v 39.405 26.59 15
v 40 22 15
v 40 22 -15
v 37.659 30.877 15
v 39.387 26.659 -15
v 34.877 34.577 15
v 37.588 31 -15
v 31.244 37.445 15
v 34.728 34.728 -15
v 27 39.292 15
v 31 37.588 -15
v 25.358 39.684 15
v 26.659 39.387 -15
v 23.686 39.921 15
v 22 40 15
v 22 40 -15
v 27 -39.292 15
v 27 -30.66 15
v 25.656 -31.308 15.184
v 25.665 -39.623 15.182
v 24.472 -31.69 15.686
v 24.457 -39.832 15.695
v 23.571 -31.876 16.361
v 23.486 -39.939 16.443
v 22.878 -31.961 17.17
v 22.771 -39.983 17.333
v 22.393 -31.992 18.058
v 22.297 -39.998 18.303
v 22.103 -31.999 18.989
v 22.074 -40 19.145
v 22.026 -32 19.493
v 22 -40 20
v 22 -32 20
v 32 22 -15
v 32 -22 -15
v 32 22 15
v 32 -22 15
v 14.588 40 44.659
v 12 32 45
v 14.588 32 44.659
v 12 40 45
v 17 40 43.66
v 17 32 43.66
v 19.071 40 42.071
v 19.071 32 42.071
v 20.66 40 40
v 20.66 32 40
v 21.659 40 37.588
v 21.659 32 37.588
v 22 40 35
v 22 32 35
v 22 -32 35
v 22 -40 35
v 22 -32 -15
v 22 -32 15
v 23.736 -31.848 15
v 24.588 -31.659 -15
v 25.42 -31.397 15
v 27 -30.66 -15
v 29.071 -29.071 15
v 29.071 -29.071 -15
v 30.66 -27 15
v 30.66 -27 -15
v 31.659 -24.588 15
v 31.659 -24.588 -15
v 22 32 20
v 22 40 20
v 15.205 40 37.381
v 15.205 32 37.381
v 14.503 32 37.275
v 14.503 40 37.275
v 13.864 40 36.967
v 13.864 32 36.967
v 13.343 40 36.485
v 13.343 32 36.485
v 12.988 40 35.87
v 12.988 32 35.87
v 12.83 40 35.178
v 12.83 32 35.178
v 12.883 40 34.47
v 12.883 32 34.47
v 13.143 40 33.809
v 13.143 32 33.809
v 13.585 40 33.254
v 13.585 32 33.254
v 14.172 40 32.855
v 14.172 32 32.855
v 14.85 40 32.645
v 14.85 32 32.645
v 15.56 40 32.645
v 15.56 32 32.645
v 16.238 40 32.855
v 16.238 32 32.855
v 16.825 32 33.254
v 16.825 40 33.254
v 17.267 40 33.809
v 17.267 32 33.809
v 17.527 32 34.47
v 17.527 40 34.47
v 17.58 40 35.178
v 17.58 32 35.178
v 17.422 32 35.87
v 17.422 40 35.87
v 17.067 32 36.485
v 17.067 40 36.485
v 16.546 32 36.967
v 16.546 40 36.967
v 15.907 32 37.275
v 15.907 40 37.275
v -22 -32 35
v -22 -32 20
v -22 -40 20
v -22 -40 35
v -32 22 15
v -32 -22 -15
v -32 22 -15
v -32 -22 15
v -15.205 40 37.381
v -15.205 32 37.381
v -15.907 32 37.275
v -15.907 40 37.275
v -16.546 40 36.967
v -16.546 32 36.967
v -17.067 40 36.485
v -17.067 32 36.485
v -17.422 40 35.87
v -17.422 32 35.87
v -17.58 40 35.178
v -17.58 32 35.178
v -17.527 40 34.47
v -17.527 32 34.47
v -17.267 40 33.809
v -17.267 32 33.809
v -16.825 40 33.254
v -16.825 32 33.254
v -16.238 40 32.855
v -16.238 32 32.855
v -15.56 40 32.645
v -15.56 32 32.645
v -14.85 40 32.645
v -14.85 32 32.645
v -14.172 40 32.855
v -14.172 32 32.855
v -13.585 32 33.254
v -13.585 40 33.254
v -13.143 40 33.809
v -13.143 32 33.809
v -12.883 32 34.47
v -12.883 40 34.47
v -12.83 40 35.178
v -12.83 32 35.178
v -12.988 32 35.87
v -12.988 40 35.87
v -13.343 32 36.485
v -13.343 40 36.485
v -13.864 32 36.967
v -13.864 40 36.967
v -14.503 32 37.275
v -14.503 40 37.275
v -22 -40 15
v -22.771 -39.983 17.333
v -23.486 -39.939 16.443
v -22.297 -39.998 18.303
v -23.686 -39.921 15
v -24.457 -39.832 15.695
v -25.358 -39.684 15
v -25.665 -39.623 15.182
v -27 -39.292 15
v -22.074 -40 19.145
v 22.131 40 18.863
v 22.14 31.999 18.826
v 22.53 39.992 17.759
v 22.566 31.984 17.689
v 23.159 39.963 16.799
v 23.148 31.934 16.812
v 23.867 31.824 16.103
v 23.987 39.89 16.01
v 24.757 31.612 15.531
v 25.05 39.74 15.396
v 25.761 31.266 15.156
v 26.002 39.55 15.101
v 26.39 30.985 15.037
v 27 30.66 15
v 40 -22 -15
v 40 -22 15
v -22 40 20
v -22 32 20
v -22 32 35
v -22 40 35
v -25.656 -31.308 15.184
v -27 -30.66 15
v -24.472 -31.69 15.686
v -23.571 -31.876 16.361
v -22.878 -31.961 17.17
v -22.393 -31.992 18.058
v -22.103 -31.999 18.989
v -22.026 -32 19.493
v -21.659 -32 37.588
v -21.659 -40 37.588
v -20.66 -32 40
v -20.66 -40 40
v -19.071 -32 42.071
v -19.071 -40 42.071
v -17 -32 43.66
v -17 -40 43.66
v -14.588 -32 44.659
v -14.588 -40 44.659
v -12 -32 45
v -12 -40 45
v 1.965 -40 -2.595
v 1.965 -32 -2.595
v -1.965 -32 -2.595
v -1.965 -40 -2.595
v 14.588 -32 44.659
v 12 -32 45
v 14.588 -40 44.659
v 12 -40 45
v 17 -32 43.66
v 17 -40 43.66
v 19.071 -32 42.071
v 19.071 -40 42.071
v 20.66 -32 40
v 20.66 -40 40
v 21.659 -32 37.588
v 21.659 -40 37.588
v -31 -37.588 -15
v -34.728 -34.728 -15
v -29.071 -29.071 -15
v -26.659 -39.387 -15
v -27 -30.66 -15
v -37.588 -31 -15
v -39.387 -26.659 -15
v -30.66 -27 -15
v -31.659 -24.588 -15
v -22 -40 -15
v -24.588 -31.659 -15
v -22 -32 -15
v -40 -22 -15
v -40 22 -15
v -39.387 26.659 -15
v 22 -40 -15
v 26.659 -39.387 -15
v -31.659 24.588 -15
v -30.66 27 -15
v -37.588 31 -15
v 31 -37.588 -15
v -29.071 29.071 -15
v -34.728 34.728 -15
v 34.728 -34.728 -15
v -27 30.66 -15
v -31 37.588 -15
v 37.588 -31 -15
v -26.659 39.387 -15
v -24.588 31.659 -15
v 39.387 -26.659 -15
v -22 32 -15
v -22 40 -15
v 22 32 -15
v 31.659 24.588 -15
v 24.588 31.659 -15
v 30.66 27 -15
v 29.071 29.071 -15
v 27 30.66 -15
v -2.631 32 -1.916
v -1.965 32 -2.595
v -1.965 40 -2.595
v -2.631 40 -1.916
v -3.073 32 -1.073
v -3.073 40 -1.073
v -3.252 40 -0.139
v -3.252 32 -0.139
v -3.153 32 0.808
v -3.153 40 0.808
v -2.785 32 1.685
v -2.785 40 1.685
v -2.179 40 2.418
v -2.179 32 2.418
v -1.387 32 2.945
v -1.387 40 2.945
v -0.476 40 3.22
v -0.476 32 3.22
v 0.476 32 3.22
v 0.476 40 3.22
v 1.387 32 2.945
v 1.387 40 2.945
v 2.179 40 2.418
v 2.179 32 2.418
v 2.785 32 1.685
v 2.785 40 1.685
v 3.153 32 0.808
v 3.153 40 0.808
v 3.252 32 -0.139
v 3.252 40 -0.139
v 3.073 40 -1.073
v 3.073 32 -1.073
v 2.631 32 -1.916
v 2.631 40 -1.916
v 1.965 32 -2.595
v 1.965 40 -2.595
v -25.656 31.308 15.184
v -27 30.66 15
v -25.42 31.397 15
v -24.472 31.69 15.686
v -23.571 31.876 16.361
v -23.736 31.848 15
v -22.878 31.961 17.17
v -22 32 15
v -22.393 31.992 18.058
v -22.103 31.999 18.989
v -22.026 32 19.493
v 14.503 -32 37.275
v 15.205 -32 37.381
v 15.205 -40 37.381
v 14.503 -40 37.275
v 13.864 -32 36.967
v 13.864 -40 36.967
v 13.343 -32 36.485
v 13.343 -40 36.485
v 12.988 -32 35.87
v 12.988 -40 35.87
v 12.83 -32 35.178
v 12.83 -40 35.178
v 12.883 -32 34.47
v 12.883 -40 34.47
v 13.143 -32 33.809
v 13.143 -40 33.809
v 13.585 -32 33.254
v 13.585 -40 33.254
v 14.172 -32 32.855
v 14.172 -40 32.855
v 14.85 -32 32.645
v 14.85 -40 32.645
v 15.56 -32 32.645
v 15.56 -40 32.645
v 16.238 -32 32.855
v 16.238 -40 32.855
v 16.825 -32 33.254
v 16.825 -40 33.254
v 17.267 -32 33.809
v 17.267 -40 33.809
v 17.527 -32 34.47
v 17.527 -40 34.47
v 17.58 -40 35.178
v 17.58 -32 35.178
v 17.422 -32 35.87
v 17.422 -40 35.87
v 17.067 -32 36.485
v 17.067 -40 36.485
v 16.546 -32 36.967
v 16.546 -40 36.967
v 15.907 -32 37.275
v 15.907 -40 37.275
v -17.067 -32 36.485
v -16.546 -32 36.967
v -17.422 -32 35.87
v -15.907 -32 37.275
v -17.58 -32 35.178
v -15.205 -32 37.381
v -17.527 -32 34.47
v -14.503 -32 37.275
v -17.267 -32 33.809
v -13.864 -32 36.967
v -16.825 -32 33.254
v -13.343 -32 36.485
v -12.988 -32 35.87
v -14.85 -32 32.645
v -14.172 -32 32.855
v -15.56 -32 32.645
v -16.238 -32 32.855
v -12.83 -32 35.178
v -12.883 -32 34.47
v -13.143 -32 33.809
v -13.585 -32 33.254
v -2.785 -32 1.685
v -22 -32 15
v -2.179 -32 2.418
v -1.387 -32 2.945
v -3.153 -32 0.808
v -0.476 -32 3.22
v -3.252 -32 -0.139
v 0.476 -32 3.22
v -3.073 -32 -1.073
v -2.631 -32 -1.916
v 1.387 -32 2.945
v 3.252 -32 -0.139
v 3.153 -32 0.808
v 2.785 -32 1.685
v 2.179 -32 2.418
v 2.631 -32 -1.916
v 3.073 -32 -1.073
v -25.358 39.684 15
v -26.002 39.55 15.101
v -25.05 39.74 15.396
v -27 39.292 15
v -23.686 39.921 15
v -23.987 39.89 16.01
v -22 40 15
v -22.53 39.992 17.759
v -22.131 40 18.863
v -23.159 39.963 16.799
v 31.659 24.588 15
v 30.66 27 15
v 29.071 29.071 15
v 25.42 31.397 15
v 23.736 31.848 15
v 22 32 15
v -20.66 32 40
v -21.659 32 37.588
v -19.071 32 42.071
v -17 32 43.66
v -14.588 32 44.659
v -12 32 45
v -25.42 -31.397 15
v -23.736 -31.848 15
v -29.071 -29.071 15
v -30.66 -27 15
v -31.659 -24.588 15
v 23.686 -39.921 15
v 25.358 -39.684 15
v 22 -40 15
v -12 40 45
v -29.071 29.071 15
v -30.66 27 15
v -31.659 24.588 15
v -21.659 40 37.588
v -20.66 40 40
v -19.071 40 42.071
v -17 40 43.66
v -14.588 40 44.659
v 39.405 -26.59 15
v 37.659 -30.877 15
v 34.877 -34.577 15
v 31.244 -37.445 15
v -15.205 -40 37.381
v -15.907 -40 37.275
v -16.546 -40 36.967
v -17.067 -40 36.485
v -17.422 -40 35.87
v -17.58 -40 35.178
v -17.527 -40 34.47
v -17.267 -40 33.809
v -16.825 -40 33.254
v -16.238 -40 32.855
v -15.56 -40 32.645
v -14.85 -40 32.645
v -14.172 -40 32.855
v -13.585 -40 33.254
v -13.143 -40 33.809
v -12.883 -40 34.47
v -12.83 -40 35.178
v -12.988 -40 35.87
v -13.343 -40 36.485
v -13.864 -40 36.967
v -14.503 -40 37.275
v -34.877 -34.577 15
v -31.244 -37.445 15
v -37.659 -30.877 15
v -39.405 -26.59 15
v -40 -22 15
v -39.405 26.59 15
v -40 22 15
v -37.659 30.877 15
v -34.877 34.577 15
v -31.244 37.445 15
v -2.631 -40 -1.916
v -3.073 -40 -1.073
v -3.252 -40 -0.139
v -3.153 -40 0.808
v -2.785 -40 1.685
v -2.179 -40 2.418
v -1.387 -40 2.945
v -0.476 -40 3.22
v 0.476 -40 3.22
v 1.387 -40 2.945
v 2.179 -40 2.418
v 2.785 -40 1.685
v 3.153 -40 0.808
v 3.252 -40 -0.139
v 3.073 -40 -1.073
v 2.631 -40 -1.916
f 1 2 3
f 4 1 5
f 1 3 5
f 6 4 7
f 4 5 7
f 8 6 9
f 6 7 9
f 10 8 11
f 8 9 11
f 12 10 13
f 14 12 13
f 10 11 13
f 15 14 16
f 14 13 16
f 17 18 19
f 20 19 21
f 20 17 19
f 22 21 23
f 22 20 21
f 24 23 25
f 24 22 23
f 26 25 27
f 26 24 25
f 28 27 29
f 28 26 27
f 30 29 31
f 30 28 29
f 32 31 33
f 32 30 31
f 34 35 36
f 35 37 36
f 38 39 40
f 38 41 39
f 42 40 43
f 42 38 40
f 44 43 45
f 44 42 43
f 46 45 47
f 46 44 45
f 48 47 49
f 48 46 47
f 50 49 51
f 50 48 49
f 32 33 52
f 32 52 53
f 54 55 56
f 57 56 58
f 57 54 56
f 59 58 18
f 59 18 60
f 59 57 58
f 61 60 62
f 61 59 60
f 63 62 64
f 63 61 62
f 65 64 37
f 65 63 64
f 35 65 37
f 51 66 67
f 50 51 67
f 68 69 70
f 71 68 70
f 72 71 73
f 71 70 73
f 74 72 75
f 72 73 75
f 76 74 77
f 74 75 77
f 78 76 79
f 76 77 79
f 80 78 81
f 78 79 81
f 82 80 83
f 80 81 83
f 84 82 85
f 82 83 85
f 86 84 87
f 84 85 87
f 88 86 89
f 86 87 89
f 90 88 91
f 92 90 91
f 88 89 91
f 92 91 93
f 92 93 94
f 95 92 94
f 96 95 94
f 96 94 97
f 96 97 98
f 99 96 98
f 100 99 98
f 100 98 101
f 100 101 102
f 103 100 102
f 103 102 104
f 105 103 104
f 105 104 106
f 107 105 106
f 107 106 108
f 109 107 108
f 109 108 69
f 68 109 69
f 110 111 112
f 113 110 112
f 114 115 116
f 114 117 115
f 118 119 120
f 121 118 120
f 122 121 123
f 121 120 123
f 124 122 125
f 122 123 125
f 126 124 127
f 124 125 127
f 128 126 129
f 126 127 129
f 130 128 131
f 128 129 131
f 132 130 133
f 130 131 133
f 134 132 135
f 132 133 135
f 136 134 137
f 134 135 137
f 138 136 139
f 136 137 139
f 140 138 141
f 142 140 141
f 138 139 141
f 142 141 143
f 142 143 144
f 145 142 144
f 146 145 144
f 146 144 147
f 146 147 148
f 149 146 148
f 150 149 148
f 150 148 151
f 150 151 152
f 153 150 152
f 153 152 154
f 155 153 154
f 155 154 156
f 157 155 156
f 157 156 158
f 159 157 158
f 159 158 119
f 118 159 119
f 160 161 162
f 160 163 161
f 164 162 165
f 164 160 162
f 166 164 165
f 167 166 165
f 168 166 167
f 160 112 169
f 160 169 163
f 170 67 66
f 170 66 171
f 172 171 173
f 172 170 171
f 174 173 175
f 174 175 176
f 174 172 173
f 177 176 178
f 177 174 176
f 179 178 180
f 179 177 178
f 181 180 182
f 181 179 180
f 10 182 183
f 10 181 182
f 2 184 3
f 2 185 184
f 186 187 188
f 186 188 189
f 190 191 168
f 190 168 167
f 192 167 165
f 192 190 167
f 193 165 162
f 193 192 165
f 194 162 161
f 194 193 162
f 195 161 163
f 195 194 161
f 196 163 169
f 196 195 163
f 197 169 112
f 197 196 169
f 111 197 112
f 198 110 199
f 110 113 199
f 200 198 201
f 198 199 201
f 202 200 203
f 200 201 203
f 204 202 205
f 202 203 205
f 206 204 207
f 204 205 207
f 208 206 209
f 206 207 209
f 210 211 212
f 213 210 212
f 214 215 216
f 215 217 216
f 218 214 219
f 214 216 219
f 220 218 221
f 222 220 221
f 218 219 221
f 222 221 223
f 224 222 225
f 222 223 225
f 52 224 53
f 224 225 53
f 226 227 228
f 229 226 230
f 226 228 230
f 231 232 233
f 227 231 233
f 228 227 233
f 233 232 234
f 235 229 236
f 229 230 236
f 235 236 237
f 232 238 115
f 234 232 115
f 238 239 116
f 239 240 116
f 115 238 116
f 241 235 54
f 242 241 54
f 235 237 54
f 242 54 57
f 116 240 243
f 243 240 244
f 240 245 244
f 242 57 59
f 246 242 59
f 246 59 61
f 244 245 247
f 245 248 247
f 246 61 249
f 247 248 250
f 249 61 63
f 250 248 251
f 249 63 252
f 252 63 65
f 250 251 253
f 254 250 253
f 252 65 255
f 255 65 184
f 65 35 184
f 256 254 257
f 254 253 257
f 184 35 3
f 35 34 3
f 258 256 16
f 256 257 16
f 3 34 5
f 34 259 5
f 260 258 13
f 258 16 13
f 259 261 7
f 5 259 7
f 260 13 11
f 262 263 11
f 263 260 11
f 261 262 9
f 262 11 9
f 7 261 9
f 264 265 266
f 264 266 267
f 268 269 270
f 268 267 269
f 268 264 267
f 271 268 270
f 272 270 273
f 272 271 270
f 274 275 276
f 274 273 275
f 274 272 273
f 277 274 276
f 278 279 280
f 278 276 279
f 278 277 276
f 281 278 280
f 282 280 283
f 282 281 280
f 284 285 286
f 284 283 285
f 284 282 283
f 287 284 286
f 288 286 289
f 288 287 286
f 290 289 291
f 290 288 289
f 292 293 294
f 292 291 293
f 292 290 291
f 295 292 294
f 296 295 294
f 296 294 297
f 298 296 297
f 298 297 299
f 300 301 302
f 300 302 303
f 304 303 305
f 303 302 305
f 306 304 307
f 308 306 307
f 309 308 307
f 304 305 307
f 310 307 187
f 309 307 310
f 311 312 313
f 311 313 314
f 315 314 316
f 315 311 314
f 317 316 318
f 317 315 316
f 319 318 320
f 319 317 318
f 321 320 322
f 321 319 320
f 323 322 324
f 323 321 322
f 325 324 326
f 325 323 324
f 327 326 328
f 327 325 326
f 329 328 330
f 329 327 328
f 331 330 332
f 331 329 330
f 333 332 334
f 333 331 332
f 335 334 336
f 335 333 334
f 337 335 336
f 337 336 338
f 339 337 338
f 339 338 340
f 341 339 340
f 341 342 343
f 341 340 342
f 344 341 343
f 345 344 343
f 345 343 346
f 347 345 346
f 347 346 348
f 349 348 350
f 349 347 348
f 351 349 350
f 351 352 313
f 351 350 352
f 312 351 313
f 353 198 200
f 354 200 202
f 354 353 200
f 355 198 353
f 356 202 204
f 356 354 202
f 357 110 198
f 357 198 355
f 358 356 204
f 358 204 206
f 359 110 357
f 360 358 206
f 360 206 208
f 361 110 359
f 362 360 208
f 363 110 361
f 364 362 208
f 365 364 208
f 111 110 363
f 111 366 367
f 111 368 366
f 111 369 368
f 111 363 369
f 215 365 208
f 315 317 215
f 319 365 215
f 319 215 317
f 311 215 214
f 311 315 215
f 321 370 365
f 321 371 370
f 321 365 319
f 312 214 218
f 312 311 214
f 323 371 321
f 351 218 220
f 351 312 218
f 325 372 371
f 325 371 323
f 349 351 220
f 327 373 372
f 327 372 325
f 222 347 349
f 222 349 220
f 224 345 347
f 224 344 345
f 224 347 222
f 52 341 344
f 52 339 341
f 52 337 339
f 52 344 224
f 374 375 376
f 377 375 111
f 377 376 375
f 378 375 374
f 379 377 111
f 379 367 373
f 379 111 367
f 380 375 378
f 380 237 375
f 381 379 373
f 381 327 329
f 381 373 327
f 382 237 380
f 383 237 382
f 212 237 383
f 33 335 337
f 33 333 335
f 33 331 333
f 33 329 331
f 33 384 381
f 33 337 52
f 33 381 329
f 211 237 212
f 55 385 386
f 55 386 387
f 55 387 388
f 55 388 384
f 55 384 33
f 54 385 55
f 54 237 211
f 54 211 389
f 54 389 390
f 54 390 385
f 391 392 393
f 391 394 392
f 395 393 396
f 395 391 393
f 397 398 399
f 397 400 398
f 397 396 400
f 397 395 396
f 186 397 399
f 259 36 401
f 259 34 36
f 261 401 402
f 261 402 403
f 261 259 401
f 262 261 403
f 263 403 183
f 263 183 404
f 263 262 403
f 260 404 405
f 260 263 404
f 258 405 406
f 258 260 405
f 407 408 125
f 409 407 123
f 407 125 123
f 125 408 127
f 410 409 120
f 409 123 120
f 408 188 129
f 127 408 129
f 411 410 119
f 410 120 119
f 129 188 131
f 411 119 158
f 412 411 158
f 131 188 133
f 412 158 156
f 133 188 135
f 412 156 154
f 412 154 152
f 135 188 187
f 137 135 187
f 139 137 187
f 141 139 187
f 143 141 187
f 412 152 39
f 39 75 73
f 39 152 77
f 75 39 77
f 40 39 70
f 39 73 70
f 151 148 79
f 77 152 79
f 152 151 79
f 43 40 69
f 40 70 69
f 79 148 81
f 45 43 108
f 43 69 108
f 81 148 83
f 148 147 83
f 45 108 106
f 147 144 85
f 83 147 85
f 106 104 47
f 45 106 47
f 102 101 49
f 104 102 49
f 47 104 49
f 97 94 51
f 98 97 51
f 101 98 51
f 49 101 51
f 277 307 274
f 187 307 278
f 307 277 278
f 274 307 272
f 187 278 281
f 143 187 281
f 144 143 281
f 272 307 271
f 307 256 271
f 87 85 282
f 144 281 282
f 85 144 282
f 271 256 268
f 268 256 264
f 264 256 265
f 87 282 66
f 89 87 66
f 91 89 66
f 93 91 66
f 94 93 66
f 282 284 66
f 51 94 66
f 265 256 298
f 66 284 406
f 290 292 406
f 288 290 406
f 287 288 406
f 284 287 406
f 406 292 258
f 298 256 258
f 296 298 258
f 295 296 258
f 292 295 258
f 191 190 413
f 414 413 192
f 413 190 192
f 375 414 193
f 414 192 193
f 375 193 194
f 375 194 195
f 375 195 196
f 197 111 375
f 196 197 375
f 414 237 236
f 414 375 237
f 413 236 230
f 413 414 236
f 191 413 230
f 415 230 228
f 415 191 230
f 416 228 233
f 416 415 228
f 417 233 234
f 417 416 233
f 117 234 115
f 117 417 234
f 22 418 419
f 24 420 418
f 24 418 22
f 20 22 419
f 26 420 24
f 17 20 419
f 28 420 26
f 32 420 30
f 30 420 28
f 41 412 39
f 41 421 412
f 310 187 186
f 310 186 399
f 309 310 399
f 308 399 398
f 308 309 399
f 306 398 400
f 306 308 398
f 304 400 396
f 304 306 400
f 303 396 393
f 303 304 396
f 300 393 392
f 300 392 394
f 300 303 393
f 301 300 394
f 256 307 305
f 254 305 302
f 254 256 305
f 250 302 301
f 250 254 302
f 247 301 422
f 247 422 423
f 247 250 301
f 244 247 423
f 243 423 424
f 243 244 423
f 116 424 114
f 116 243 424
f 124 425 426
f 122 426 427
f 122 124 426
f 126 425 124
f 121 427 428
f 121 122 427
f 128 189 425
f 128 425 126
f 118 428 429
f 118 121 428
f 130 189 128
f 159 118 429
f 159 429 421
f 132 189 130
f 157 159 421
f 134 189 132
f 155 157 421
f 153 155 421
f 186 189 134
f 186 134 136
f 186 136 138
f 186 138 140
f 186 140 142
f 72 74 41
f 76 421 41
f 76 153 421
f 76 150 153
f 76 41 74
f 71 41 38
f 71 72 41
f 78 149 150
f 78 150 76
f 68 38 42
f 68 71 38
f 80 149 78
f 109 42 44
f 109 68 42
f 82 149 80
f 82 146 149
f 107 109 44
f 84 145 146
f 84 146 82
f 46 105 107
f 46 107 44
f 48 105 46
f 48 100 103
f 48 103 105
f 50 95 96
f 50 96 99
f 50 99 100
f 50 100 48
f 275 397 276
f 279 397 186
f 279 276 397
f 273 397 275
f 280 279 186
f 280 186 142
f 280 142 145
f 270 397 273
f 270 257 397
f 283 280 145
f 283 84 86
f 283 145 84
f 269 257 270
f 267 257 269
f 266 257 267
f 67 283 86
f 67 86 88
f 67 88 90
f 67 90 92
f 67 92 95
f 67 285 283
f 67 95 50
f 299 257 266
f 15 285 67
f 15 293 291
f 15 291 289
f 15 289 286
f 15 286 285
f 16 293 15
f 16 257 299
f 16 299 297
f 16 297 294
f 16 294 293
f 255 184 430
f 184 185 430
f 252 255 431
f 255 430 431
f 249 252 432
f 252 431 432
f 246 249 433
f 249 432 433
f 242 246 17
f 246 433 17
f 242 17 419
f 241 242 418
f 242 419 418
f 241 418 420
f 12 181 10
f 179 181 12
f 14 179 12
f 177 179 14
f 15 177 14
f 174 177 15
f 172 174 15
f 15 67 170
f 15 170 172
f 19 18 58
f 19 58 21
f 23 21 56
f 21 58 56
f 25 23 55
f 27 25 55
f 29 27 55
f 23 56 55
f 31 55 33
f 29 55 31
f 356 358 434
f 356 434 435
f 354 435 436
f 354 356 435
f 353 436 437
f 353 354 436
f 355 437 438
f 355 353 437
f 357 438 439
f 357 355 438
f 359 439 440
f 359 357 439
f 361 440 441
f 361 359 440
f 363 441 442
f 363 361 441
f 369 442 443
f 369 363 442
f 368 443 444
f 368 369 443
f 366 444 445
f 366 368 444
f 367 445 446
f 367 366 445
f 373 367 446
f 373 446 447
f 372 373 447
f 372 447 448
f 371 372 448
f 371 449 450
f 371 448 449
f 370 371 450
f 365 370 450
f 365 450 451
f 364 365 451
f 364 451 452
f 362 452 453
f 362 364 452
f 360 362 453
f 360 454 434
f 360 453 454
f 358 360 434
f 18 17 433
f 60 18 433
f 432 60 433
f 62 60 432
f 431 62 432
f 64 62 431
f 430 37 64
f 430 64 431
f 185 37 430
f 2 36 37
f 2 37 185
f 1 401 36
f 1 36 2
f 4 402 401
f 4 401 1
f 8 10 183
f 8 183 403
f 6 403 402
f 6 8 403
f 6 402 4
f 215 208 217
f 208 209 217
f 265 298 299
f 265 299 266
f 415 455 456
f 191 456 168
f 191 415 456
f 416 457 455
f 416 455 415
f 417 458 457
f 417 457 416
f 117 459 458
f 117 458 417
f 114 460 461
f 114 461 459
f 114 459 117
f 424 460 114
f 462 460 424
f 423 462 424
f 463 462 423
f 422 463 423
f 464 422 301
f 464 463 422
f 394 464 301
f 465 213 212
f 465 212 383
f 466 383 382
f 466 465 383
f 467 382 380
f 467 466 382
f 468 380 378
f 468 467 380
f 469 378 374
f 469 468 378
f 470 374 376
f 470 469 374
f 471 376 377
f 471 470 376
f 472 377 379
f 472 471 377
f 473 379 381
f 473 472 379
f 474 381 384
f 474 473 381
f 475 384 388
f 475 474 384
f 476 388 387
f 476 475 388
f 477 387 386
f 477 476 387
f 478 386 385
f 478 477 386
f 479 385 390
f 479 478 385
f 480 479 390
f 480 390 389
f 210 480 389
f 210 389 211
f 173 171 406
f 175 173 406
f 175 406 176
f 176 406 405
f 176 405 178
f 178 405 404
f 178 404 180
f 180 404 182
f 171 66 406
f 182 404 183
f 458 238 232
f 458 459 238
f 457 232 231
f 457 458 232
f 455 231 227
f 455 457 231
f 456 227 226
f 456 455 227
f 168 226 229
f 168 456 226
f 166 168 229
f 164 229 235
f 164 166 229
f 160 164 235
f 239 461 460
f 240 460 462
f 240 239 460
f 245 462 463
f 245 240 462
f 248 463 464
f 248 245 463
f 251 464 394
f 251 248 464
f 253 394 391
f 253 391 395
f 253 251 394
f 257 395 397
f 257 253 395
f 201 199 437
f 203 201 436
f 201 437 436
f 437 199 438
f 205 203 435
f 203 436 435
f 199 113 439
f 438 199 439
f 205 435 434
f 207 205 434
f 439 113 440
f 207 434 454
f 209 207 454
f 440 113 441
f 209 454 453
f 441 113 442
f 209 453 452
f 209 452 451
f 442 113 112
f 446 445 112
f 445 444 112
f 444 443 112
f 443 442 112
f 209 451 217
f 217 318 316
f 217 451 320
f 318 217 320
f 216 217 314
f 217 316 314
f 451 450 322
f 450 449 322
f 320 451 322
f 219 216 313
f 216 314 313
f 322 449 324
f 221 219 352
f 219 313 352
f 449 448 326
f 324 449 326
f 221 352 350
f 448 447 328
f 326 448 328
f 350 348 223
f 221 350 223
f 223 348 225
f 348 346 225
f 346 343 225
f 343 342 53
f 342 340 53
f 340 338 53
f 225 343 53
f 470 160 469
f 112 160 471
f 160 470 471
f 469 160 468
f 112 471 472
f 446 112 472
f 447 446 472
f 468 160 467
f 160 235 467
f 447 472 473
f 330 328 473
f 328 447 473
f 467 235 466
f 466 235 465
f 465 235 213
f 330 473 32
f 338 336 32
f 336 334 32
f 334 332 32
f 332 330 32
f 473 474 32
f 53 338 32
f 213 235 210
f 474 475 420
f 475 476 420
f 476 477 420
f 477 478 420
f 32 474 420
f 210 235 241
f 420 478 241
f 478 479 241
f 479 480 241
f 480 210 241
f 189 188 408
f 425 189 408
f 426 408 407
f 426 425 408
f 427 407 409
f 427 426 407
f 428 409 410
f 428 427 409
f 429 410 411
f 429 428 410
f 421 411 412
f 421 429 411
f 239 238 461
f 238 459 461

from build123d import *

# Parameters (mm, degrees)
ESQUISSE1_W                             = 80
ESQUISSE1_H                             = 80
ESQUISSE1_W_2                           = 64
ESQUISSE1_H_2                           = 64
BOSS_EXTRU_1_DEPTH                      = 15
CONG_2_R                                = 18
CONG_3_R                                = 10
ESQUISSE7_W                             = 44
ESQUISSE7_H                             = 8
BOSS_EXTRU_4_DEPTH                      = 30
PER_AGE_POUR_CROUS_AUTO_BLOQUANTS_300_D = 4.7625
CONG_1_R                                = 10
CONG_1_OF_SYM_TRIE2_R                   = 10
CONG_4_R                                = 5
ENL_V_MAT_EXTRU_3_DEPTH                 = 124.38962689


with BuildPart() as part:
    # Esquisse1 → Boss.-Extru.1 (new, symmetric)
    with BuildSketch(Plane.XY):
        Rectangle(ESQUISSE1_W, ESQUISSE1_H)
        Rectangle(ESQUISSE1_W_2, ESQUISSE1_H_2, mode=Mode.SUBTRACT)
    extrude(amount=BOSS_EXTRU_1_DEPTH, both=True)

    # Congé2
    cong_2_edges = [part.edges().sort_by_distance(p)[0] for p in [
        (-40, 40, 0),
        (40, 40, 0),
        (40, -40, 0),
        (-40, -40, 0),
    ]]
    fillet(cong_2_edges, radius=CONG_2_R)

    # Congé3
    cong_3_edges = [part.edges().sort_by_distance(p)[0] for p in [
        (32, -32, 0),
        (32, 32, 0),
        (-32, 32, 0),
        (-32, -32, 0),
    ]]
    fillet(cong_3_edges, radius=CONG_3_R)

    # Esquisse7 → Boss.-Extru.4 (add)
    with BuildSketch(Plane.XY.offset(15)):
        with Locations((0, 36)):
            Rectangle(ESQUISSE7_W, ESQUISSE7_H)
    boss_extru_4 = extrude(amount=BOSS_EXTRU_4_DEPTH)

    # Perçage pour écrous auto-bloquants 300® #6 (SP)1 (through all)
    with Locations(Plane(origin=(0, 40, 0), x_dir=(0, 0, -1), z_dir=(0, 1, 0))):
        with Locations((-35, -15.205), (-35, 15.205)):
            per_age_pour_crous_auto_bloquants_300 = Hole(PER_AGE_POUR_CROUS_AUTO_BLOQUANTS_300_D / 2)

    # Congé1
    cong_1_edges = [part.edges().sort_by_distance(p)[0] for p in [
        (22, 36, 45),
        (-22, 36, 45),
    ]]
    fillet(cong_1_edges, radius=CONG_1_R)

    # Symétrie2: Boss.-Extru.4, Perçage pour écrous auto-bloquants 300® #6 (SP)1 across plane
    add(boss_extru_4.mirror(Plane.ZX))
    add(per_age_pour_crous_auto_bloquants_300.mirror(Plane.ZX), mode=Mode.SUBTRACT)

    # Congé1 of Symétrie2
    cong_1_of_sym_trie2_edges = [part.edges().sort_by_distance(p)[0] for p in [
        (22, -36, 45),
        (-22, -36, 45),
    ]]
    fillet(cong_1_of_sym_trie2_edges, radius=CONG_1_OF_SYM_TRIE2_R)

    # Congé4
    # the kernel refuses this fillet: 5 mm, written as the material it adds along each edge
    with BuildSketch(Plane(origin=(22, -52.5, 15), x_dir=(0, 0, 1), z_dir=(0, 1, 0))) as cong_4_piece_1_section:
        with BuildLine():
            CenterArc((CONG_4_R, CONG_4_R), CONG_4_R, 180, 90)
            Line((0, CONG_4_R), (0, 0))
            Line((0, 0), (CONG_4_R, 0))
        make_face()
    cong_4_piece_1 = extrude(amount=33, mode=Mode.PRIVATE)
    cong_4_piece_1 = cong_4_piece_1 - Plane(origin=(22, -22, 16.121951886), x_dir=(0, -1, 0), z_dir=(0, 0, -1)) * Cylinder(10, 86, mode=Mode.PRIVATE)
    cong_4_piece_1 = cong_4_piece_1 & Plane(origin=(22, -22, 16.121951886), x_dir=(0, -1, 0), z_dir=(0, 0, 1)) * Cylinder(18, 86, mode=Mode.PRIVATE)
    add(cong_4_piece_1)
    with BuildSketch(Plane(origin=(-22, -19.5, 15), x_dir=(0, 0, 1), z_dir=(0, -1, 0))) as cong_4_piece_2_section:
        with BuildLine():
            CenterArc((CONG_4_R, CONG_4_R), CONG_4_R, 180, 90)
            Line((0, CONG_4_R), (0, 0))
            Line((0, 0), (CONG_4_R, 0))
        make_face()
    cong_4_piece_2 = extrude(amount=33, mode=Mode.PRIVATE)
    cong_4_piece_2 = cong_4_piece_2 - Plane(origin=(-22, -22, 15.430791952), x_dir=(0, -1, 0), z_dir=(0, 0, 1)) * Cylinder(10, 87, mode=Mode.PRIVATE)
    cong_4_piece_2 = cong_4_piece_2 & Plane(origin=(-22, -22, 15.430791952), x_dir=(0, -1, 0), z_dir=(0, 0, -1)) * Cylinder(18, 87, mode=Mode.PRIVATE)
    add(cong_4_piece_2)
    with BuildSketch(Plane(origin=(22, 52.5, 15), x_dir=(1, 0, 0), z_dir=(0, -1, 0))) as cong_4_piece_3_section:
        with BuildLine():
            CenterArc((CONG_4_R, CONG_4_R), CONG_4_R, 180, 90)
            Line((0, CONG_4_R), (0, 0))
            Line((0, 0), (CONG_4_R, 0))
        make_face()
    cong_4_piece_3 = extrude(amount=33, mode=Mode.PRIVATE)
    cong_4_piece_3 = cong_4_piece_3 - Plane(origin=(22, 22, 16.121951469), x_dir=(1, 0, 0), z_dir=(0, 0, -1)) * Cylinder(10, 86, mode=Mode.PRIVATE)
    cong_4_piece_3 = cong_4_piece_3 & Plane(origin=(22, 22, 16.121951469), x_dir=(0, 1, 0), z_dir=(0, 0, 1)) * Cylinder(18, 86, mode=Mode.PRIVATE)
    add(cong_4_piece_3)
    with BuildSketch(Plane(origin=(-22, 19.5, 15), x_dir=(-1, 0, 0), z_dir=(0, 1, 0))) as cong_4_piece_4_section:
        with BuildLine():
            CenterArc((CONG_4_R, CONG_4_R), CONG_4_R, 180, 90)
            Line((0, CONG_4_R), (0, 0))
            Line((0, 0), (CONG_4_R, 0))
        make_face()
    cong_4_piece_4 = extrude(amount=33, mode=Mode.PRIVATE)
    cong_4_piece_4 = cong_4_piece_4 - Plane(origin=(-22, 22, 15.430738001), x_dir=(0, 1, 0), z_dir=(0, 0, -1)) * Cylinder(10, 87, mode=Mode.PRIVATE)
    cong_4_piece_4 = cong_4_piece_4 & Plane(origin=(-22, 22, 15.430738001), x_dir=(0, 1, 0), z_dir=(0, 0, -1)) * Cylinder(18, 87, mode=Mode.PRIVATE)
    add(cong_4_piece_4)

    # Esquisse11 → Enlèv. mat.-Extru.3 (cut, through all)
    with BuildSketch(Plane(origin=(0, -40, -40), x_dir=(1, 0, 0), z_dir=(0, 1, 0))):
        with BuildLine():
            Line((1.964942747, -37.405), (-1.964942747, -37.405))
            ThreePointArc((-1.964942747, -37.405), (0, -43.255), (1.964942747, -37.405))
        make_face()
    extrude(amount=ENL_V_MAT_EXTRU_3_DEPTH, mode=Mode.SUBTRACT)


solid = part.part
